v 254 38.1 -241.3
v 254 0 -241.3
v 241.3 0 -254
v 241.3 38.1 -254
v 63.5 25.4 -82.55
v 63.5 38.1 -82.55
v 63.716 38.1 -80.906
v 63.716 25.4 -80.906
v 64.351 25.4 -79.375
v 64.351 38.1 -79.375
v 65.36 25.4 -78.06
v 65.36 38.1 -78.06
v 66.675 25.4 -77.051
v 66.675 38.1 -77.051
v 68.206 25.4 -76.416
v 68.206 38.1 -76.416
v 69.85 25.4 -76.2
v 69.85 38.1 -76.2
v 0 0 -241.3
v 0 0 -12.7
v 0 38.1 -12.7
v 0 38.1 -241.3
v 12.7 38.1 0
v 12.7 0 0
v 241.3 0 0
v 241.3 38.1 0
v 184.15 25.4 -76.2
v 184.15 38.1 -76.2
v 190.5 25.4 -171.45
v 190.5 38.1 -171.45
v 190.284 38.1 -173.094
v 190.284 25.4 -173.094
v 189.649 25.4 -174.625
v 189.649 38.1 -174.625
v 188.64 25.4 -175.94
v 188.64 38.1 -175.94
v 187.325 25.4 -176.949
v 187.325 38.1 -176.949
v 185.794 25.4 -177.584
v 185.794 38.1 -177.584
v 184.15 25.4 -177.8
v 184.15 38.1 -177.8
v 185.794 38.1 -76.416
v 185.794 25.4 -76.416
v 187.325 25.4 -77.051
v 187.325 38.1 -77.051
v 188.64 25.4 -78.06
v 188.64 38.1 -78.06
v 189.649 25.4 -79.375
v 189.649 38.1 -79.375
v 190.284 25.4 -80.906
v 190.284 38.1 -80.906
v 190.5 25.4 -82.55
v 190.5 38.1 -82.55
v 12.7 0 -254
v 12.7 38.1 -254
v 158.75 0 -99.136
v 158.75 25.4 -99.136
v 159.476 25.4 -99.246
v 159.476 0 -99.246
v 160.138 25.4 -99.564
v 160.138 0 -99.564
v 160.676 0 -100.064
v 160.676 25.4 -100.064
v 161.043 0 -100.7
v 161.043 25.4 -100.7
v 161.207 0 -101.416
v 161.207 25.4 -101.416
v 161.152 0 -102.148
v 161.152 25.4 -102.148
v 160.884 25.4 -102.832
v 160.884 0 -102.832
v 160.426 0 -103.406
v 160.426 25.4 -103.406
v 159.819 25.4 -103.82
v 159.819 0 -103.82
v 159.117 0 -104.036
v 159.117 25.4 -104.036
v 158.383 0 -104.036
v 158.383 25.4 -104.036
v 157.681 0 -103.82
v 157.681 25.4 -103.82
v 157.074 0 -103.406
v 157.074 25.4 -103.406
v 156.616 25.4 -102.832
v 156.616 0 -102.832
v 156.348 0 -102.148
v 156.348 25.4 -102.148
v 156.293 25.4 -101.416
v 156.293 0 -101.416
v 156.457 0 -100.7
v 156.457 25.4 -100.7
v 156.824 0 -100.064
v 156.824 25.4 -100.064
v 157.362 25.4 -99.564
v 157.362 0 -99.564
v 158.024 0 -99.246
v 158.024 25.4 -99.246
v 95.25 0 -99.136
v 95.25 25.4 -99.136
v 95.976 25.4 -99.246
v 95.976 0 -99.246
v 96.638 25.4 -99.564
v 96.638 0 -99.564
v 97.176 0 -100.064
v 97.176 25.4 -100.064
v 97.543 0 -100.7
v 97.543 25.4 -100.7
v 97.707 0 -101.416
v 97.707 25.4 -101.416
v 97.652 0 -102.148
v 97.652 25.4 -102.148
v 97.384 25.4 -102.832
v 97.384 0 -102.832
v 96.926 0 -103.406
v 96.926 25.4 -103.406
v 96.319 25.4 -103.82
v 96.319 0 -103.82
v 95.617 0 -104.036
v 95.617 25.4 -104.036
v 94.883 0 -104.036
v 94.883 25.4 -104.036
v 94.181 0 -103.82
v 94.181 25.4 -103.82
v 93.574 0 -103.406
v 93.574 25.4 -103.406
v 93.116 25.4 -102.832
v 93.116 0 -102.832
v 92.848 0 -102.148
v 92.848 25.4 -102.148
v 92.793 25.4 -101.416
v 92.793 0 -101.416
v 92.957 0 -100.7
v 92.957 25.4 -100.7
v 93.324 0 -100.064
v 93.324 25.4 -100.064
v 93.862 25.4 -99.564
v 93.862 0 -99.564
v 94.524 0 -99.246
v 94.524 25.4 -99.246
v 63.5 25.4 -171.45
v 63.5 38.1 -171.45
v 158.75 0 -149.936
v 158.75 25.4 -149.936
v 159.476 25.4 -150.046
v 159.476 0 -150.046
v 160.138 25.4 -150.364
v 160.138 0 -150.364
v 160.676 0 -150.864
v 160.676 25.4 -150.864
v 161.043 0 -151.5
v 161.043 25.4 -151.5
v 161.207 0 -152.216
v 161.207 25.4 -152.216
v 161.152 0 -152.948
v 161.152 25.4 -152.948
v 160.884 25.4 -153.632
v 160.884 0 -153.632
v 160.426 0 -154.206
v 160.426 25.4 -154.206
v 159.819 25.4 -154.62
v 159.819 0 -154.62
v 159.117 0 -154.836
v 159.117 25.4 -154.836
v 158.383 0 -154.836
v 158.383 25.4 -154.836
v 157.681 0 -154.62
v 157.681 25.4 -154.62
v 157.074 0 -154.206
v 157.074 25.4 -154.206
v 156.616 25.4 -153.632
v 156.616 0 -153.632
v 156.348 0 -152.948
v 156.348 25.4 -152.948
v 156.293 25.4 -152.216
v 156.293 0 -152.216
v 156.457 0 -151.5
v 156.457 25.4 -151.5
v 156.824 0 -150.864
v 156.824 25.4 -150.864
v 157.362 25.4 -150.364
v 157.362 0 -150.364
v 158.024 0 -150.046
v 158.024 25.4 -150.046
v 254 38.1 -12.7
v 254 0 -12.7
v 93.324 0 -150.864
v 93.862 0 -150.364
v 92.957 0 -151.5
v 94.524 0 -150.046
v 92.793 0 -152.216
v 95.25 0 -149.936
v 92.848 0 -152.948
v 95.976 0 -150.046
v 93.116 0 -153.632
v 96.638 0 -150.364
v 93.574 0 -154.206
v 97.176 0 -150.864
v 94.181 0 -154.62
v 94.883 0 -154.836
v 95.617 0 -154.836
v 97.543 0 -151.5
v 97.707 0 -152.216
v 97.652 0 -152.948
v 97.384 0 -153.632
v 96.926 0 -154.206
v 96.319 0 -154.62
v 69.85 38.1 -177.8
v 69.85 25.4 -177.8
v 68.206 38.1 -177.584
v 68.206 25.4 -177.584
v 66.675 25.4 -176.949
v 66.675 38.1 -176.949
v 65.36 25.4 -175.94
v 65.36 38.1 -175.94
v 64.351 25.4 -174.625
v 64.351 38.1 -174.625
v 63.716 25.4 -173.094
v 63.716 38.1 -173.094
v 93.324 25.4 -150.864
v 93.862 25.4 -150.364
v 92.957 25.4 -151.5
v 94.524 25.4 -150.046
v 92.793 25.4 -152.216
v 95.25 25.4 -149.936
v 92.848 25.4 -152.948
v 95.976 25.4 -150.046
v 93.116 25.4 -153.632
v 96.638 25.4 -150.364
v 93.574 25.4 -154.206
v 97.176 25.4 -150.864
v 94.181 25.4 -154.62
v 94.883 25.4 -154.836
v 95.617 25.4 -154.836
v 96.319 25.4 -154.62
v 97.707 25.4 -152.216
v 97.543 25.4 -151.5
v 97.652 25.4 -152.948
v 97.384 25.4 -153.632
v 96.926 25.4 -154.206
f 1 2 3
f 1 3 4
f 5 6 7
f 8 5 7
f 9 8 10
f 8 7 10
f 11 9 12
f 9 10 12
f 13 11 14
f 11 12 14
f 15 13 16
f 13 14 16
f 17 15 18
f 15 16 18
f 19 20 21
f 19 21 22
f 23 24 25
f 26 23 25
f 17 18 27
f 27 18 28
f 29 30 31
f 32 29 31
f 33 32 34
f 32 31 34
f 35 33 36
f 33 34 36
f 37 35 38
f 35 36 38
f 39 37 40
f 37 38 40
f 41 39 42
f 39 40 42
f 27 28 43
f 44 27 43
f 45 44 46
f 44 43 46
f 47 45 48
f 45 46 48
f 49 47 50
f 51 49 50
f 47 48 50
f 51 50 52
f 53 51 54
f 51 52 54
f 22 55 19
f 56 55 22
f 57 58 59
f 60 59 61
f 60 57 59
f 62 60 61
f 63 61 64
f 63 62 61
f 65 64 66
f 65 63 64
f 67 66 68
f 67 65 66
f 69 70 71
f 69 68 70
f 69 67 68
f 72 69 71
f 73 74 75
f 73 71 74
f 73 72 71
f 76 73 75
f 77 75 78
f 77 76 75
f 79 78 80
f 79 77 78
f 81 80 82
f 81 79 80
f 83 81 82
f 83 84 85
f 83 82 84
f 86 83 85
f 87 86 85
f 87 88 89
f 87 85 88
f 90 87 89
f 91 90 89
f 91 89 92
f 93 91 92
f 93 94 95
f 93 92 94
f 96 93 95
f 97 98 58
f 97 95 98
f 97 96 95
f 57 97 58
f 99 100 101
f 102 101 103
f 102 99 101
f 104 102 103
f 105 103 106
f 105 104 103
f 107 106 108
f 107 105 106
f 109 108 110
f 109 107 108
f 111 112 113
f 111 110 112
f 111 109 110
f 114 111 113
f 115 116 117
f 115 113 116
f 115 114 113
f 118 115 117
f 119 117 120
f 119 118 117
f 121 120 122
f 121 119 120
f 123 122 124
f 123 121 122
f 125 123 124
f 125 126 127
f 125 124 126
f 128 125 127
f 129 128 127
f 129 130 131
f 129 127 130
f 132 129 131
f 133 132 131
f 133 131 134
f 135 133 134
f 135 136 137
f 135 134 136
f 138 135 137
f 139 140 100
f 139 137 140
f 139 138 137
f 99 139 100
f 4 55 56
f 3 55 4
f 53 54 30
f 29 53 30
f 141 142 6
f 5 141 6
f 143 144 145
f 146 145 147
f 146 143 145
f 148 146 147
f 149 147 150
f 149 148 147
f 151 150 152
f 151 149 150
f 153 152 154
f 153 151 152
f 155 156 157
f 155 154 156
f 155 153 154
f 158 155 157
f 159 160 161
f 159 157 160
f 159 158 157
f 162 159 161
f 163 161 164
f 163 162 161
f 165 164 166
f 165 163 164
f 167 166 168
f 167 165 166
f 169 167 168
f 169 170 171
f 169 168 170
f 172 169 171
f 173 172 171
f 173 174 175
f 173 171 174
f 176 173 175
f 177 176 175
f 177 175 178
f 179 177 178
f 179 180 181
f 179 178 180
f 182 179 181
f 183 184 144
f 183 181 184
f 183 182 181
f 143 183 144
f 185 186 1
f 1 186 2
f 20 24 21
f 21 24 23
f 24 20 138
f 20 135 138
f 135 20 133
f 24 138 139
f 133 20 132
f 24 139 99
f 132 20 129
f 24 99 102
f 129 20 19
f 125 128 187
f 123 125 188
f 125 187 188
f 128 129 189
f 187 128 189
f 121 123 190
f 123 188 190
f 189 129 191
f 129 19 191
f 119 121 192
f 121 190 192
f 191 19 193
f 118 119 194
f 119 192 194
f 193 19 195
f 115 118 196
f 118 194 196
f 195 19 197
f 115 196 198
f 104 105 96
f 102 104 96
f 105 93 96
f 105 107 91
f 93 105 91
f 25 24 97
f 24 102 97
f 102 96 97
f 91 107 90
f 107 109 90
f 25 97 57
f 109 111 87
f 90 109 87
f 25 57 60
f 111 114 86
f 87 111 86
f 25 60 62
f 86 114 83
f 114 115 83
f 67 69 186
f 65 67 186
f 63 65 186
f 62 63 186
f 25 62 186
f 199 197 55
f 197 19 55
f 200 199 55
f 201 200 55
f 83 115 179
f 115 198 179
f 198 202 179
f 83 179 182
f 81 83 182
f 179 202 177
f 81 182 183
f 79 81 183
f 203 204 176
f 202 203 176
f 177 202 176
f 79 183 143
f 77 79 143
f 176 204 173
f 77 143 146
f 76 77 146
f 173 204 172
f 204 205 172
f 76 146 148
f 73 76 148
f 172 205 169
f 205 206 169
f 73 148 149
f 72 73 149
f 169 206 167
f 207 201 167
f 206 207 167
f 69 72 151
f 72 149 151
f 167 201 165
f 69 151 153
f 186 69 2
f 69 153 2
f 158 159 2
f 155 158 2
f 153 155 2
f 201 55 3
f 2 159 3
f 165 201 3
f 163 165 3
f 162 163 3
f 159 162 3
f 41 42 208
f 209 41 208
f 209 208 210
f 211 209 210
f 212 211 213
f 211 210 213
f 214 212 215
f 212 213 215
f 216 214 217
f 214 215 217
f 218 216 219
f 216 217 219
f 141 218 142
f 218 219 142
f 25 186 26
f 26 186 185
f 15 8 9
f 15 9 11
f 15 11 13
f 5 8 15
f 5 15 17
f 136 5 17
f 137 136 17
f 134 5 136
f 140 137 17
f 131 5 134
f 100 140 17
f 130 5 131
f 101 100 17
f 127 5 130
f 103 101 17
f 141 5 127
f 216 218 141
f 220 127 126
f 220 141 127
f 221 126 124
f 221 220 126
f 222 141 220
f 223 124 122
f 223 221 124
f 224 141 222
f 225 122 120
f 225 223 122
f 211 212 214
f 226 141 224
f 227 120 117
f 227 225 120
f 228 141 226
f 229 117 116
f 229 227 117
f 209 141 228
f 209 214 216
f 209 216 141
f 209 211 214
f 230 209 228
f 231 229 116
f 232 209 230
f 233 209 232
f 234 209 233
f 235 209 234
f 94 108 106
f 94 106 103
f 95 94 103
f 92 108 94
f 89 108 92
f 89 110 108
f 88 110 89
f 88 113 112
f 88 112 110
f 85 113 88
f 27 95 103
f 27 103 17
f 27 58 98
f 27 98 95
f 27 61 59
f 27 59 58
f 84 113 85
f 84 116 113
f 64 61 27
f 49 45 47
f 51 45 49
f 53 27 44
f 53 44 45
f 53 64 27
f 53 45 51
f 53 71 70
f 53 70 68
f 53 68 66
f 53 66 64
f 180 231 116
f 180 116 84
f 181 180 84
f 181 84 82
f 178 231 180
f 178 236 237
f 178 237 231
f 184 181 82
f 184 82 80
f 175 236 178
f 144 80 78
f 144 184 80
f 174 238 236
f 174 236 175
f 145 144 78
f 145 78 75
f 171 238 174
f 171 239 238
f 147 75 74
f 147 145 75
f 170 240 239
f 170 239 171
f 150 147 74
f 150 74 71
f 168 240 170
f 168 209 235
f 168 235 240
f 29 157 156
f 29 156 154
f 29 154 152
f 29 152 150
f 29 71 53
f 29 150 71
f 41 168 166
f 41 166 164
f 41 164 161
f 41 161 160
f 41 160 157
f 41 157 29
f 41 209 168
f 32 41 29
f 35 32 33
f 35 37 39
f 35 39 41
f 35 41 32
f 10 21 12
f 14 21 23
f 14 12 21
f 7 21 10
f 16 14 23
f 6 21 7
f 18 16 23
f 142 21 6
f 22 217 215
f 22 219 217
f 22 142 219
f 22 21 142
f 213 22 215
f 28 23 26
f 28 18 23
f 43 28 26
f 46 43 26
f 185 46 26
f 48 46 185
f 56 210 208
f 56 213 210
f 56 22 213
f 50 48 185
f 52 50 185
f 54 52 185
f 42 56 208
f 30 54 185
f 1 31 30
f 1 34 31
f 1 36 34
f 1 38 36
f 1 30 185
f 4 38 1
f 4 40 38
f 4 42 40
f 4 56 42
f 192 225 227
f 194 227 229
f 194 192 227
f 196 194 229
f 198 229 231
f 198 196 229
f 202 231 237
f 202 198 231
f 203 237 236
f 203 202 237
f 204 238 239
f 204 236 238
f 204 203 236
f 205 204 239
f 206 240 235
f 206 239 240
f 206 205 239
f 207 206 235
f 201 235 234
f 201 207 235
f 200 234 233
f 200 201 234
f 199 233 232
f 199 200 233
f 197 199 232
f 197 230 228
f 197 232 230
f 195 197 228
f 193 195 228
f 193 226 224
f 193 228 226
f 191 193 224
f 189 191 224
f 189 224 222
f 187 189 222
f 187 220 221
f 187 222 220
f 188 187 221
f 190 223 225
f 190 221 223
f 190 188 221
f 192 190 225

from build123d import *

# Parameters (mm, degrees)
SKETCH1_W               = 254
SKETCH1_H               = 254
BOSS_EXTRUDE1_DEPTH     = 38.1
CUT_EXTRUDE1_DEPTH      = 12.7
CUT_EXTRUDE2_DEPTH      = 361.10715072
CUT_EXTRUDE2_DEPTH_BACK = 361.10715072
SKETCH4_R               = 2.4638
CHAMFER1_SIZE           = 12.7


with BuildPart() as part:
    # Sketch1 → Boss-Extrude1 (new body)
    with BuildSketch(Plane(origin=(0, 0, 0), x_dir=(1, 0, 0), z_dir=(0, 1, 0))):
        with Locations((127, 127)):
            Rectangle(SKETCH1_W, SKETCH1_H)
    extrude(amount=BOSS_EXTRUDE1_DEPTH)

    # Sketch2 → Cut-Extrude1 (cut)
    with BuildSketch(Plane(origin=(0, 38.1, 0), x_dir=(1, 0, 0), z_dir=(0, 1, 0))):
        with BuildLine():
            Line((69.85, 76.2), (184.15, 76.2))
            ThreePointArc((184.15, 76.2), (188.640128061, 78.059871939), (190.5, 82.55))
            Line((190.5, 82.55), (190.5, 171.45))
            ThreePointArc((190.5, 171.45), (188.640128061, 175.940128061), (184.15, 177.8))
            Line((184.15, 177.8), (69.85, 177.8))
            ThreePointArc((69.85, 177.8), (65.359871939, 175.940128061), (63.5, 171.45))
            Line((63.5, 171.45), (63.5, 82.55))
            ThreePointArc((63.5, 82.55), (65.359871939, 78.059871939), (69.85, 76.2))
        make_face()
    extrude(amount=-CUT_EXTRUDE1_DEPTH, mode=Mode.SUBTRACT)

    # Sketch4 → Cut-Extrude2 (cut, two sides: drawn at the far end of the back side and taken through both)
    with BuildSketch(Plane(origin=(0, 25.4, 0), x_dir=(1, 0, 0), z_dir=(0, 1, 0)).offset(-CUT_EXTRUDE2_DEPTH_BACK)):
        with Locations(Location((95.25, 152.4, 0), (0, 0, 270))):
            Circle(SKETCH4_R)
        with Locations(Location((158.75, 152.4, 0), (0, 0, 270))):
            Circle(SKETCH4_R)
        with Locations(Location((158.75, 101.6, 0), (0, 0, 270))):
            Circle(SKETCH4_R)
        with Locations(Location((95.25, 101.6, 0), (0, 0, 270))):
            Circle(SKETCH4_R)
    extrude(amount=CUT_EXTRUDE2_DEPTH + CUT_EXTRUDE2_DEPTH_BACK, mode=Mode.SUBTRACT)

    # Chamfer1
    chamfer1_edges = [part.edges().sort_by_distance(p)[0] for p in [
        (0, 19.05, -254),
        (0, 19.05, 0),
        (254, 19.05, 0),
        (254, 19.05, -254),
    ]]
    chamfer(chamfer1_edges, length=CHAMFER1_SIZE)


solid = part.part
